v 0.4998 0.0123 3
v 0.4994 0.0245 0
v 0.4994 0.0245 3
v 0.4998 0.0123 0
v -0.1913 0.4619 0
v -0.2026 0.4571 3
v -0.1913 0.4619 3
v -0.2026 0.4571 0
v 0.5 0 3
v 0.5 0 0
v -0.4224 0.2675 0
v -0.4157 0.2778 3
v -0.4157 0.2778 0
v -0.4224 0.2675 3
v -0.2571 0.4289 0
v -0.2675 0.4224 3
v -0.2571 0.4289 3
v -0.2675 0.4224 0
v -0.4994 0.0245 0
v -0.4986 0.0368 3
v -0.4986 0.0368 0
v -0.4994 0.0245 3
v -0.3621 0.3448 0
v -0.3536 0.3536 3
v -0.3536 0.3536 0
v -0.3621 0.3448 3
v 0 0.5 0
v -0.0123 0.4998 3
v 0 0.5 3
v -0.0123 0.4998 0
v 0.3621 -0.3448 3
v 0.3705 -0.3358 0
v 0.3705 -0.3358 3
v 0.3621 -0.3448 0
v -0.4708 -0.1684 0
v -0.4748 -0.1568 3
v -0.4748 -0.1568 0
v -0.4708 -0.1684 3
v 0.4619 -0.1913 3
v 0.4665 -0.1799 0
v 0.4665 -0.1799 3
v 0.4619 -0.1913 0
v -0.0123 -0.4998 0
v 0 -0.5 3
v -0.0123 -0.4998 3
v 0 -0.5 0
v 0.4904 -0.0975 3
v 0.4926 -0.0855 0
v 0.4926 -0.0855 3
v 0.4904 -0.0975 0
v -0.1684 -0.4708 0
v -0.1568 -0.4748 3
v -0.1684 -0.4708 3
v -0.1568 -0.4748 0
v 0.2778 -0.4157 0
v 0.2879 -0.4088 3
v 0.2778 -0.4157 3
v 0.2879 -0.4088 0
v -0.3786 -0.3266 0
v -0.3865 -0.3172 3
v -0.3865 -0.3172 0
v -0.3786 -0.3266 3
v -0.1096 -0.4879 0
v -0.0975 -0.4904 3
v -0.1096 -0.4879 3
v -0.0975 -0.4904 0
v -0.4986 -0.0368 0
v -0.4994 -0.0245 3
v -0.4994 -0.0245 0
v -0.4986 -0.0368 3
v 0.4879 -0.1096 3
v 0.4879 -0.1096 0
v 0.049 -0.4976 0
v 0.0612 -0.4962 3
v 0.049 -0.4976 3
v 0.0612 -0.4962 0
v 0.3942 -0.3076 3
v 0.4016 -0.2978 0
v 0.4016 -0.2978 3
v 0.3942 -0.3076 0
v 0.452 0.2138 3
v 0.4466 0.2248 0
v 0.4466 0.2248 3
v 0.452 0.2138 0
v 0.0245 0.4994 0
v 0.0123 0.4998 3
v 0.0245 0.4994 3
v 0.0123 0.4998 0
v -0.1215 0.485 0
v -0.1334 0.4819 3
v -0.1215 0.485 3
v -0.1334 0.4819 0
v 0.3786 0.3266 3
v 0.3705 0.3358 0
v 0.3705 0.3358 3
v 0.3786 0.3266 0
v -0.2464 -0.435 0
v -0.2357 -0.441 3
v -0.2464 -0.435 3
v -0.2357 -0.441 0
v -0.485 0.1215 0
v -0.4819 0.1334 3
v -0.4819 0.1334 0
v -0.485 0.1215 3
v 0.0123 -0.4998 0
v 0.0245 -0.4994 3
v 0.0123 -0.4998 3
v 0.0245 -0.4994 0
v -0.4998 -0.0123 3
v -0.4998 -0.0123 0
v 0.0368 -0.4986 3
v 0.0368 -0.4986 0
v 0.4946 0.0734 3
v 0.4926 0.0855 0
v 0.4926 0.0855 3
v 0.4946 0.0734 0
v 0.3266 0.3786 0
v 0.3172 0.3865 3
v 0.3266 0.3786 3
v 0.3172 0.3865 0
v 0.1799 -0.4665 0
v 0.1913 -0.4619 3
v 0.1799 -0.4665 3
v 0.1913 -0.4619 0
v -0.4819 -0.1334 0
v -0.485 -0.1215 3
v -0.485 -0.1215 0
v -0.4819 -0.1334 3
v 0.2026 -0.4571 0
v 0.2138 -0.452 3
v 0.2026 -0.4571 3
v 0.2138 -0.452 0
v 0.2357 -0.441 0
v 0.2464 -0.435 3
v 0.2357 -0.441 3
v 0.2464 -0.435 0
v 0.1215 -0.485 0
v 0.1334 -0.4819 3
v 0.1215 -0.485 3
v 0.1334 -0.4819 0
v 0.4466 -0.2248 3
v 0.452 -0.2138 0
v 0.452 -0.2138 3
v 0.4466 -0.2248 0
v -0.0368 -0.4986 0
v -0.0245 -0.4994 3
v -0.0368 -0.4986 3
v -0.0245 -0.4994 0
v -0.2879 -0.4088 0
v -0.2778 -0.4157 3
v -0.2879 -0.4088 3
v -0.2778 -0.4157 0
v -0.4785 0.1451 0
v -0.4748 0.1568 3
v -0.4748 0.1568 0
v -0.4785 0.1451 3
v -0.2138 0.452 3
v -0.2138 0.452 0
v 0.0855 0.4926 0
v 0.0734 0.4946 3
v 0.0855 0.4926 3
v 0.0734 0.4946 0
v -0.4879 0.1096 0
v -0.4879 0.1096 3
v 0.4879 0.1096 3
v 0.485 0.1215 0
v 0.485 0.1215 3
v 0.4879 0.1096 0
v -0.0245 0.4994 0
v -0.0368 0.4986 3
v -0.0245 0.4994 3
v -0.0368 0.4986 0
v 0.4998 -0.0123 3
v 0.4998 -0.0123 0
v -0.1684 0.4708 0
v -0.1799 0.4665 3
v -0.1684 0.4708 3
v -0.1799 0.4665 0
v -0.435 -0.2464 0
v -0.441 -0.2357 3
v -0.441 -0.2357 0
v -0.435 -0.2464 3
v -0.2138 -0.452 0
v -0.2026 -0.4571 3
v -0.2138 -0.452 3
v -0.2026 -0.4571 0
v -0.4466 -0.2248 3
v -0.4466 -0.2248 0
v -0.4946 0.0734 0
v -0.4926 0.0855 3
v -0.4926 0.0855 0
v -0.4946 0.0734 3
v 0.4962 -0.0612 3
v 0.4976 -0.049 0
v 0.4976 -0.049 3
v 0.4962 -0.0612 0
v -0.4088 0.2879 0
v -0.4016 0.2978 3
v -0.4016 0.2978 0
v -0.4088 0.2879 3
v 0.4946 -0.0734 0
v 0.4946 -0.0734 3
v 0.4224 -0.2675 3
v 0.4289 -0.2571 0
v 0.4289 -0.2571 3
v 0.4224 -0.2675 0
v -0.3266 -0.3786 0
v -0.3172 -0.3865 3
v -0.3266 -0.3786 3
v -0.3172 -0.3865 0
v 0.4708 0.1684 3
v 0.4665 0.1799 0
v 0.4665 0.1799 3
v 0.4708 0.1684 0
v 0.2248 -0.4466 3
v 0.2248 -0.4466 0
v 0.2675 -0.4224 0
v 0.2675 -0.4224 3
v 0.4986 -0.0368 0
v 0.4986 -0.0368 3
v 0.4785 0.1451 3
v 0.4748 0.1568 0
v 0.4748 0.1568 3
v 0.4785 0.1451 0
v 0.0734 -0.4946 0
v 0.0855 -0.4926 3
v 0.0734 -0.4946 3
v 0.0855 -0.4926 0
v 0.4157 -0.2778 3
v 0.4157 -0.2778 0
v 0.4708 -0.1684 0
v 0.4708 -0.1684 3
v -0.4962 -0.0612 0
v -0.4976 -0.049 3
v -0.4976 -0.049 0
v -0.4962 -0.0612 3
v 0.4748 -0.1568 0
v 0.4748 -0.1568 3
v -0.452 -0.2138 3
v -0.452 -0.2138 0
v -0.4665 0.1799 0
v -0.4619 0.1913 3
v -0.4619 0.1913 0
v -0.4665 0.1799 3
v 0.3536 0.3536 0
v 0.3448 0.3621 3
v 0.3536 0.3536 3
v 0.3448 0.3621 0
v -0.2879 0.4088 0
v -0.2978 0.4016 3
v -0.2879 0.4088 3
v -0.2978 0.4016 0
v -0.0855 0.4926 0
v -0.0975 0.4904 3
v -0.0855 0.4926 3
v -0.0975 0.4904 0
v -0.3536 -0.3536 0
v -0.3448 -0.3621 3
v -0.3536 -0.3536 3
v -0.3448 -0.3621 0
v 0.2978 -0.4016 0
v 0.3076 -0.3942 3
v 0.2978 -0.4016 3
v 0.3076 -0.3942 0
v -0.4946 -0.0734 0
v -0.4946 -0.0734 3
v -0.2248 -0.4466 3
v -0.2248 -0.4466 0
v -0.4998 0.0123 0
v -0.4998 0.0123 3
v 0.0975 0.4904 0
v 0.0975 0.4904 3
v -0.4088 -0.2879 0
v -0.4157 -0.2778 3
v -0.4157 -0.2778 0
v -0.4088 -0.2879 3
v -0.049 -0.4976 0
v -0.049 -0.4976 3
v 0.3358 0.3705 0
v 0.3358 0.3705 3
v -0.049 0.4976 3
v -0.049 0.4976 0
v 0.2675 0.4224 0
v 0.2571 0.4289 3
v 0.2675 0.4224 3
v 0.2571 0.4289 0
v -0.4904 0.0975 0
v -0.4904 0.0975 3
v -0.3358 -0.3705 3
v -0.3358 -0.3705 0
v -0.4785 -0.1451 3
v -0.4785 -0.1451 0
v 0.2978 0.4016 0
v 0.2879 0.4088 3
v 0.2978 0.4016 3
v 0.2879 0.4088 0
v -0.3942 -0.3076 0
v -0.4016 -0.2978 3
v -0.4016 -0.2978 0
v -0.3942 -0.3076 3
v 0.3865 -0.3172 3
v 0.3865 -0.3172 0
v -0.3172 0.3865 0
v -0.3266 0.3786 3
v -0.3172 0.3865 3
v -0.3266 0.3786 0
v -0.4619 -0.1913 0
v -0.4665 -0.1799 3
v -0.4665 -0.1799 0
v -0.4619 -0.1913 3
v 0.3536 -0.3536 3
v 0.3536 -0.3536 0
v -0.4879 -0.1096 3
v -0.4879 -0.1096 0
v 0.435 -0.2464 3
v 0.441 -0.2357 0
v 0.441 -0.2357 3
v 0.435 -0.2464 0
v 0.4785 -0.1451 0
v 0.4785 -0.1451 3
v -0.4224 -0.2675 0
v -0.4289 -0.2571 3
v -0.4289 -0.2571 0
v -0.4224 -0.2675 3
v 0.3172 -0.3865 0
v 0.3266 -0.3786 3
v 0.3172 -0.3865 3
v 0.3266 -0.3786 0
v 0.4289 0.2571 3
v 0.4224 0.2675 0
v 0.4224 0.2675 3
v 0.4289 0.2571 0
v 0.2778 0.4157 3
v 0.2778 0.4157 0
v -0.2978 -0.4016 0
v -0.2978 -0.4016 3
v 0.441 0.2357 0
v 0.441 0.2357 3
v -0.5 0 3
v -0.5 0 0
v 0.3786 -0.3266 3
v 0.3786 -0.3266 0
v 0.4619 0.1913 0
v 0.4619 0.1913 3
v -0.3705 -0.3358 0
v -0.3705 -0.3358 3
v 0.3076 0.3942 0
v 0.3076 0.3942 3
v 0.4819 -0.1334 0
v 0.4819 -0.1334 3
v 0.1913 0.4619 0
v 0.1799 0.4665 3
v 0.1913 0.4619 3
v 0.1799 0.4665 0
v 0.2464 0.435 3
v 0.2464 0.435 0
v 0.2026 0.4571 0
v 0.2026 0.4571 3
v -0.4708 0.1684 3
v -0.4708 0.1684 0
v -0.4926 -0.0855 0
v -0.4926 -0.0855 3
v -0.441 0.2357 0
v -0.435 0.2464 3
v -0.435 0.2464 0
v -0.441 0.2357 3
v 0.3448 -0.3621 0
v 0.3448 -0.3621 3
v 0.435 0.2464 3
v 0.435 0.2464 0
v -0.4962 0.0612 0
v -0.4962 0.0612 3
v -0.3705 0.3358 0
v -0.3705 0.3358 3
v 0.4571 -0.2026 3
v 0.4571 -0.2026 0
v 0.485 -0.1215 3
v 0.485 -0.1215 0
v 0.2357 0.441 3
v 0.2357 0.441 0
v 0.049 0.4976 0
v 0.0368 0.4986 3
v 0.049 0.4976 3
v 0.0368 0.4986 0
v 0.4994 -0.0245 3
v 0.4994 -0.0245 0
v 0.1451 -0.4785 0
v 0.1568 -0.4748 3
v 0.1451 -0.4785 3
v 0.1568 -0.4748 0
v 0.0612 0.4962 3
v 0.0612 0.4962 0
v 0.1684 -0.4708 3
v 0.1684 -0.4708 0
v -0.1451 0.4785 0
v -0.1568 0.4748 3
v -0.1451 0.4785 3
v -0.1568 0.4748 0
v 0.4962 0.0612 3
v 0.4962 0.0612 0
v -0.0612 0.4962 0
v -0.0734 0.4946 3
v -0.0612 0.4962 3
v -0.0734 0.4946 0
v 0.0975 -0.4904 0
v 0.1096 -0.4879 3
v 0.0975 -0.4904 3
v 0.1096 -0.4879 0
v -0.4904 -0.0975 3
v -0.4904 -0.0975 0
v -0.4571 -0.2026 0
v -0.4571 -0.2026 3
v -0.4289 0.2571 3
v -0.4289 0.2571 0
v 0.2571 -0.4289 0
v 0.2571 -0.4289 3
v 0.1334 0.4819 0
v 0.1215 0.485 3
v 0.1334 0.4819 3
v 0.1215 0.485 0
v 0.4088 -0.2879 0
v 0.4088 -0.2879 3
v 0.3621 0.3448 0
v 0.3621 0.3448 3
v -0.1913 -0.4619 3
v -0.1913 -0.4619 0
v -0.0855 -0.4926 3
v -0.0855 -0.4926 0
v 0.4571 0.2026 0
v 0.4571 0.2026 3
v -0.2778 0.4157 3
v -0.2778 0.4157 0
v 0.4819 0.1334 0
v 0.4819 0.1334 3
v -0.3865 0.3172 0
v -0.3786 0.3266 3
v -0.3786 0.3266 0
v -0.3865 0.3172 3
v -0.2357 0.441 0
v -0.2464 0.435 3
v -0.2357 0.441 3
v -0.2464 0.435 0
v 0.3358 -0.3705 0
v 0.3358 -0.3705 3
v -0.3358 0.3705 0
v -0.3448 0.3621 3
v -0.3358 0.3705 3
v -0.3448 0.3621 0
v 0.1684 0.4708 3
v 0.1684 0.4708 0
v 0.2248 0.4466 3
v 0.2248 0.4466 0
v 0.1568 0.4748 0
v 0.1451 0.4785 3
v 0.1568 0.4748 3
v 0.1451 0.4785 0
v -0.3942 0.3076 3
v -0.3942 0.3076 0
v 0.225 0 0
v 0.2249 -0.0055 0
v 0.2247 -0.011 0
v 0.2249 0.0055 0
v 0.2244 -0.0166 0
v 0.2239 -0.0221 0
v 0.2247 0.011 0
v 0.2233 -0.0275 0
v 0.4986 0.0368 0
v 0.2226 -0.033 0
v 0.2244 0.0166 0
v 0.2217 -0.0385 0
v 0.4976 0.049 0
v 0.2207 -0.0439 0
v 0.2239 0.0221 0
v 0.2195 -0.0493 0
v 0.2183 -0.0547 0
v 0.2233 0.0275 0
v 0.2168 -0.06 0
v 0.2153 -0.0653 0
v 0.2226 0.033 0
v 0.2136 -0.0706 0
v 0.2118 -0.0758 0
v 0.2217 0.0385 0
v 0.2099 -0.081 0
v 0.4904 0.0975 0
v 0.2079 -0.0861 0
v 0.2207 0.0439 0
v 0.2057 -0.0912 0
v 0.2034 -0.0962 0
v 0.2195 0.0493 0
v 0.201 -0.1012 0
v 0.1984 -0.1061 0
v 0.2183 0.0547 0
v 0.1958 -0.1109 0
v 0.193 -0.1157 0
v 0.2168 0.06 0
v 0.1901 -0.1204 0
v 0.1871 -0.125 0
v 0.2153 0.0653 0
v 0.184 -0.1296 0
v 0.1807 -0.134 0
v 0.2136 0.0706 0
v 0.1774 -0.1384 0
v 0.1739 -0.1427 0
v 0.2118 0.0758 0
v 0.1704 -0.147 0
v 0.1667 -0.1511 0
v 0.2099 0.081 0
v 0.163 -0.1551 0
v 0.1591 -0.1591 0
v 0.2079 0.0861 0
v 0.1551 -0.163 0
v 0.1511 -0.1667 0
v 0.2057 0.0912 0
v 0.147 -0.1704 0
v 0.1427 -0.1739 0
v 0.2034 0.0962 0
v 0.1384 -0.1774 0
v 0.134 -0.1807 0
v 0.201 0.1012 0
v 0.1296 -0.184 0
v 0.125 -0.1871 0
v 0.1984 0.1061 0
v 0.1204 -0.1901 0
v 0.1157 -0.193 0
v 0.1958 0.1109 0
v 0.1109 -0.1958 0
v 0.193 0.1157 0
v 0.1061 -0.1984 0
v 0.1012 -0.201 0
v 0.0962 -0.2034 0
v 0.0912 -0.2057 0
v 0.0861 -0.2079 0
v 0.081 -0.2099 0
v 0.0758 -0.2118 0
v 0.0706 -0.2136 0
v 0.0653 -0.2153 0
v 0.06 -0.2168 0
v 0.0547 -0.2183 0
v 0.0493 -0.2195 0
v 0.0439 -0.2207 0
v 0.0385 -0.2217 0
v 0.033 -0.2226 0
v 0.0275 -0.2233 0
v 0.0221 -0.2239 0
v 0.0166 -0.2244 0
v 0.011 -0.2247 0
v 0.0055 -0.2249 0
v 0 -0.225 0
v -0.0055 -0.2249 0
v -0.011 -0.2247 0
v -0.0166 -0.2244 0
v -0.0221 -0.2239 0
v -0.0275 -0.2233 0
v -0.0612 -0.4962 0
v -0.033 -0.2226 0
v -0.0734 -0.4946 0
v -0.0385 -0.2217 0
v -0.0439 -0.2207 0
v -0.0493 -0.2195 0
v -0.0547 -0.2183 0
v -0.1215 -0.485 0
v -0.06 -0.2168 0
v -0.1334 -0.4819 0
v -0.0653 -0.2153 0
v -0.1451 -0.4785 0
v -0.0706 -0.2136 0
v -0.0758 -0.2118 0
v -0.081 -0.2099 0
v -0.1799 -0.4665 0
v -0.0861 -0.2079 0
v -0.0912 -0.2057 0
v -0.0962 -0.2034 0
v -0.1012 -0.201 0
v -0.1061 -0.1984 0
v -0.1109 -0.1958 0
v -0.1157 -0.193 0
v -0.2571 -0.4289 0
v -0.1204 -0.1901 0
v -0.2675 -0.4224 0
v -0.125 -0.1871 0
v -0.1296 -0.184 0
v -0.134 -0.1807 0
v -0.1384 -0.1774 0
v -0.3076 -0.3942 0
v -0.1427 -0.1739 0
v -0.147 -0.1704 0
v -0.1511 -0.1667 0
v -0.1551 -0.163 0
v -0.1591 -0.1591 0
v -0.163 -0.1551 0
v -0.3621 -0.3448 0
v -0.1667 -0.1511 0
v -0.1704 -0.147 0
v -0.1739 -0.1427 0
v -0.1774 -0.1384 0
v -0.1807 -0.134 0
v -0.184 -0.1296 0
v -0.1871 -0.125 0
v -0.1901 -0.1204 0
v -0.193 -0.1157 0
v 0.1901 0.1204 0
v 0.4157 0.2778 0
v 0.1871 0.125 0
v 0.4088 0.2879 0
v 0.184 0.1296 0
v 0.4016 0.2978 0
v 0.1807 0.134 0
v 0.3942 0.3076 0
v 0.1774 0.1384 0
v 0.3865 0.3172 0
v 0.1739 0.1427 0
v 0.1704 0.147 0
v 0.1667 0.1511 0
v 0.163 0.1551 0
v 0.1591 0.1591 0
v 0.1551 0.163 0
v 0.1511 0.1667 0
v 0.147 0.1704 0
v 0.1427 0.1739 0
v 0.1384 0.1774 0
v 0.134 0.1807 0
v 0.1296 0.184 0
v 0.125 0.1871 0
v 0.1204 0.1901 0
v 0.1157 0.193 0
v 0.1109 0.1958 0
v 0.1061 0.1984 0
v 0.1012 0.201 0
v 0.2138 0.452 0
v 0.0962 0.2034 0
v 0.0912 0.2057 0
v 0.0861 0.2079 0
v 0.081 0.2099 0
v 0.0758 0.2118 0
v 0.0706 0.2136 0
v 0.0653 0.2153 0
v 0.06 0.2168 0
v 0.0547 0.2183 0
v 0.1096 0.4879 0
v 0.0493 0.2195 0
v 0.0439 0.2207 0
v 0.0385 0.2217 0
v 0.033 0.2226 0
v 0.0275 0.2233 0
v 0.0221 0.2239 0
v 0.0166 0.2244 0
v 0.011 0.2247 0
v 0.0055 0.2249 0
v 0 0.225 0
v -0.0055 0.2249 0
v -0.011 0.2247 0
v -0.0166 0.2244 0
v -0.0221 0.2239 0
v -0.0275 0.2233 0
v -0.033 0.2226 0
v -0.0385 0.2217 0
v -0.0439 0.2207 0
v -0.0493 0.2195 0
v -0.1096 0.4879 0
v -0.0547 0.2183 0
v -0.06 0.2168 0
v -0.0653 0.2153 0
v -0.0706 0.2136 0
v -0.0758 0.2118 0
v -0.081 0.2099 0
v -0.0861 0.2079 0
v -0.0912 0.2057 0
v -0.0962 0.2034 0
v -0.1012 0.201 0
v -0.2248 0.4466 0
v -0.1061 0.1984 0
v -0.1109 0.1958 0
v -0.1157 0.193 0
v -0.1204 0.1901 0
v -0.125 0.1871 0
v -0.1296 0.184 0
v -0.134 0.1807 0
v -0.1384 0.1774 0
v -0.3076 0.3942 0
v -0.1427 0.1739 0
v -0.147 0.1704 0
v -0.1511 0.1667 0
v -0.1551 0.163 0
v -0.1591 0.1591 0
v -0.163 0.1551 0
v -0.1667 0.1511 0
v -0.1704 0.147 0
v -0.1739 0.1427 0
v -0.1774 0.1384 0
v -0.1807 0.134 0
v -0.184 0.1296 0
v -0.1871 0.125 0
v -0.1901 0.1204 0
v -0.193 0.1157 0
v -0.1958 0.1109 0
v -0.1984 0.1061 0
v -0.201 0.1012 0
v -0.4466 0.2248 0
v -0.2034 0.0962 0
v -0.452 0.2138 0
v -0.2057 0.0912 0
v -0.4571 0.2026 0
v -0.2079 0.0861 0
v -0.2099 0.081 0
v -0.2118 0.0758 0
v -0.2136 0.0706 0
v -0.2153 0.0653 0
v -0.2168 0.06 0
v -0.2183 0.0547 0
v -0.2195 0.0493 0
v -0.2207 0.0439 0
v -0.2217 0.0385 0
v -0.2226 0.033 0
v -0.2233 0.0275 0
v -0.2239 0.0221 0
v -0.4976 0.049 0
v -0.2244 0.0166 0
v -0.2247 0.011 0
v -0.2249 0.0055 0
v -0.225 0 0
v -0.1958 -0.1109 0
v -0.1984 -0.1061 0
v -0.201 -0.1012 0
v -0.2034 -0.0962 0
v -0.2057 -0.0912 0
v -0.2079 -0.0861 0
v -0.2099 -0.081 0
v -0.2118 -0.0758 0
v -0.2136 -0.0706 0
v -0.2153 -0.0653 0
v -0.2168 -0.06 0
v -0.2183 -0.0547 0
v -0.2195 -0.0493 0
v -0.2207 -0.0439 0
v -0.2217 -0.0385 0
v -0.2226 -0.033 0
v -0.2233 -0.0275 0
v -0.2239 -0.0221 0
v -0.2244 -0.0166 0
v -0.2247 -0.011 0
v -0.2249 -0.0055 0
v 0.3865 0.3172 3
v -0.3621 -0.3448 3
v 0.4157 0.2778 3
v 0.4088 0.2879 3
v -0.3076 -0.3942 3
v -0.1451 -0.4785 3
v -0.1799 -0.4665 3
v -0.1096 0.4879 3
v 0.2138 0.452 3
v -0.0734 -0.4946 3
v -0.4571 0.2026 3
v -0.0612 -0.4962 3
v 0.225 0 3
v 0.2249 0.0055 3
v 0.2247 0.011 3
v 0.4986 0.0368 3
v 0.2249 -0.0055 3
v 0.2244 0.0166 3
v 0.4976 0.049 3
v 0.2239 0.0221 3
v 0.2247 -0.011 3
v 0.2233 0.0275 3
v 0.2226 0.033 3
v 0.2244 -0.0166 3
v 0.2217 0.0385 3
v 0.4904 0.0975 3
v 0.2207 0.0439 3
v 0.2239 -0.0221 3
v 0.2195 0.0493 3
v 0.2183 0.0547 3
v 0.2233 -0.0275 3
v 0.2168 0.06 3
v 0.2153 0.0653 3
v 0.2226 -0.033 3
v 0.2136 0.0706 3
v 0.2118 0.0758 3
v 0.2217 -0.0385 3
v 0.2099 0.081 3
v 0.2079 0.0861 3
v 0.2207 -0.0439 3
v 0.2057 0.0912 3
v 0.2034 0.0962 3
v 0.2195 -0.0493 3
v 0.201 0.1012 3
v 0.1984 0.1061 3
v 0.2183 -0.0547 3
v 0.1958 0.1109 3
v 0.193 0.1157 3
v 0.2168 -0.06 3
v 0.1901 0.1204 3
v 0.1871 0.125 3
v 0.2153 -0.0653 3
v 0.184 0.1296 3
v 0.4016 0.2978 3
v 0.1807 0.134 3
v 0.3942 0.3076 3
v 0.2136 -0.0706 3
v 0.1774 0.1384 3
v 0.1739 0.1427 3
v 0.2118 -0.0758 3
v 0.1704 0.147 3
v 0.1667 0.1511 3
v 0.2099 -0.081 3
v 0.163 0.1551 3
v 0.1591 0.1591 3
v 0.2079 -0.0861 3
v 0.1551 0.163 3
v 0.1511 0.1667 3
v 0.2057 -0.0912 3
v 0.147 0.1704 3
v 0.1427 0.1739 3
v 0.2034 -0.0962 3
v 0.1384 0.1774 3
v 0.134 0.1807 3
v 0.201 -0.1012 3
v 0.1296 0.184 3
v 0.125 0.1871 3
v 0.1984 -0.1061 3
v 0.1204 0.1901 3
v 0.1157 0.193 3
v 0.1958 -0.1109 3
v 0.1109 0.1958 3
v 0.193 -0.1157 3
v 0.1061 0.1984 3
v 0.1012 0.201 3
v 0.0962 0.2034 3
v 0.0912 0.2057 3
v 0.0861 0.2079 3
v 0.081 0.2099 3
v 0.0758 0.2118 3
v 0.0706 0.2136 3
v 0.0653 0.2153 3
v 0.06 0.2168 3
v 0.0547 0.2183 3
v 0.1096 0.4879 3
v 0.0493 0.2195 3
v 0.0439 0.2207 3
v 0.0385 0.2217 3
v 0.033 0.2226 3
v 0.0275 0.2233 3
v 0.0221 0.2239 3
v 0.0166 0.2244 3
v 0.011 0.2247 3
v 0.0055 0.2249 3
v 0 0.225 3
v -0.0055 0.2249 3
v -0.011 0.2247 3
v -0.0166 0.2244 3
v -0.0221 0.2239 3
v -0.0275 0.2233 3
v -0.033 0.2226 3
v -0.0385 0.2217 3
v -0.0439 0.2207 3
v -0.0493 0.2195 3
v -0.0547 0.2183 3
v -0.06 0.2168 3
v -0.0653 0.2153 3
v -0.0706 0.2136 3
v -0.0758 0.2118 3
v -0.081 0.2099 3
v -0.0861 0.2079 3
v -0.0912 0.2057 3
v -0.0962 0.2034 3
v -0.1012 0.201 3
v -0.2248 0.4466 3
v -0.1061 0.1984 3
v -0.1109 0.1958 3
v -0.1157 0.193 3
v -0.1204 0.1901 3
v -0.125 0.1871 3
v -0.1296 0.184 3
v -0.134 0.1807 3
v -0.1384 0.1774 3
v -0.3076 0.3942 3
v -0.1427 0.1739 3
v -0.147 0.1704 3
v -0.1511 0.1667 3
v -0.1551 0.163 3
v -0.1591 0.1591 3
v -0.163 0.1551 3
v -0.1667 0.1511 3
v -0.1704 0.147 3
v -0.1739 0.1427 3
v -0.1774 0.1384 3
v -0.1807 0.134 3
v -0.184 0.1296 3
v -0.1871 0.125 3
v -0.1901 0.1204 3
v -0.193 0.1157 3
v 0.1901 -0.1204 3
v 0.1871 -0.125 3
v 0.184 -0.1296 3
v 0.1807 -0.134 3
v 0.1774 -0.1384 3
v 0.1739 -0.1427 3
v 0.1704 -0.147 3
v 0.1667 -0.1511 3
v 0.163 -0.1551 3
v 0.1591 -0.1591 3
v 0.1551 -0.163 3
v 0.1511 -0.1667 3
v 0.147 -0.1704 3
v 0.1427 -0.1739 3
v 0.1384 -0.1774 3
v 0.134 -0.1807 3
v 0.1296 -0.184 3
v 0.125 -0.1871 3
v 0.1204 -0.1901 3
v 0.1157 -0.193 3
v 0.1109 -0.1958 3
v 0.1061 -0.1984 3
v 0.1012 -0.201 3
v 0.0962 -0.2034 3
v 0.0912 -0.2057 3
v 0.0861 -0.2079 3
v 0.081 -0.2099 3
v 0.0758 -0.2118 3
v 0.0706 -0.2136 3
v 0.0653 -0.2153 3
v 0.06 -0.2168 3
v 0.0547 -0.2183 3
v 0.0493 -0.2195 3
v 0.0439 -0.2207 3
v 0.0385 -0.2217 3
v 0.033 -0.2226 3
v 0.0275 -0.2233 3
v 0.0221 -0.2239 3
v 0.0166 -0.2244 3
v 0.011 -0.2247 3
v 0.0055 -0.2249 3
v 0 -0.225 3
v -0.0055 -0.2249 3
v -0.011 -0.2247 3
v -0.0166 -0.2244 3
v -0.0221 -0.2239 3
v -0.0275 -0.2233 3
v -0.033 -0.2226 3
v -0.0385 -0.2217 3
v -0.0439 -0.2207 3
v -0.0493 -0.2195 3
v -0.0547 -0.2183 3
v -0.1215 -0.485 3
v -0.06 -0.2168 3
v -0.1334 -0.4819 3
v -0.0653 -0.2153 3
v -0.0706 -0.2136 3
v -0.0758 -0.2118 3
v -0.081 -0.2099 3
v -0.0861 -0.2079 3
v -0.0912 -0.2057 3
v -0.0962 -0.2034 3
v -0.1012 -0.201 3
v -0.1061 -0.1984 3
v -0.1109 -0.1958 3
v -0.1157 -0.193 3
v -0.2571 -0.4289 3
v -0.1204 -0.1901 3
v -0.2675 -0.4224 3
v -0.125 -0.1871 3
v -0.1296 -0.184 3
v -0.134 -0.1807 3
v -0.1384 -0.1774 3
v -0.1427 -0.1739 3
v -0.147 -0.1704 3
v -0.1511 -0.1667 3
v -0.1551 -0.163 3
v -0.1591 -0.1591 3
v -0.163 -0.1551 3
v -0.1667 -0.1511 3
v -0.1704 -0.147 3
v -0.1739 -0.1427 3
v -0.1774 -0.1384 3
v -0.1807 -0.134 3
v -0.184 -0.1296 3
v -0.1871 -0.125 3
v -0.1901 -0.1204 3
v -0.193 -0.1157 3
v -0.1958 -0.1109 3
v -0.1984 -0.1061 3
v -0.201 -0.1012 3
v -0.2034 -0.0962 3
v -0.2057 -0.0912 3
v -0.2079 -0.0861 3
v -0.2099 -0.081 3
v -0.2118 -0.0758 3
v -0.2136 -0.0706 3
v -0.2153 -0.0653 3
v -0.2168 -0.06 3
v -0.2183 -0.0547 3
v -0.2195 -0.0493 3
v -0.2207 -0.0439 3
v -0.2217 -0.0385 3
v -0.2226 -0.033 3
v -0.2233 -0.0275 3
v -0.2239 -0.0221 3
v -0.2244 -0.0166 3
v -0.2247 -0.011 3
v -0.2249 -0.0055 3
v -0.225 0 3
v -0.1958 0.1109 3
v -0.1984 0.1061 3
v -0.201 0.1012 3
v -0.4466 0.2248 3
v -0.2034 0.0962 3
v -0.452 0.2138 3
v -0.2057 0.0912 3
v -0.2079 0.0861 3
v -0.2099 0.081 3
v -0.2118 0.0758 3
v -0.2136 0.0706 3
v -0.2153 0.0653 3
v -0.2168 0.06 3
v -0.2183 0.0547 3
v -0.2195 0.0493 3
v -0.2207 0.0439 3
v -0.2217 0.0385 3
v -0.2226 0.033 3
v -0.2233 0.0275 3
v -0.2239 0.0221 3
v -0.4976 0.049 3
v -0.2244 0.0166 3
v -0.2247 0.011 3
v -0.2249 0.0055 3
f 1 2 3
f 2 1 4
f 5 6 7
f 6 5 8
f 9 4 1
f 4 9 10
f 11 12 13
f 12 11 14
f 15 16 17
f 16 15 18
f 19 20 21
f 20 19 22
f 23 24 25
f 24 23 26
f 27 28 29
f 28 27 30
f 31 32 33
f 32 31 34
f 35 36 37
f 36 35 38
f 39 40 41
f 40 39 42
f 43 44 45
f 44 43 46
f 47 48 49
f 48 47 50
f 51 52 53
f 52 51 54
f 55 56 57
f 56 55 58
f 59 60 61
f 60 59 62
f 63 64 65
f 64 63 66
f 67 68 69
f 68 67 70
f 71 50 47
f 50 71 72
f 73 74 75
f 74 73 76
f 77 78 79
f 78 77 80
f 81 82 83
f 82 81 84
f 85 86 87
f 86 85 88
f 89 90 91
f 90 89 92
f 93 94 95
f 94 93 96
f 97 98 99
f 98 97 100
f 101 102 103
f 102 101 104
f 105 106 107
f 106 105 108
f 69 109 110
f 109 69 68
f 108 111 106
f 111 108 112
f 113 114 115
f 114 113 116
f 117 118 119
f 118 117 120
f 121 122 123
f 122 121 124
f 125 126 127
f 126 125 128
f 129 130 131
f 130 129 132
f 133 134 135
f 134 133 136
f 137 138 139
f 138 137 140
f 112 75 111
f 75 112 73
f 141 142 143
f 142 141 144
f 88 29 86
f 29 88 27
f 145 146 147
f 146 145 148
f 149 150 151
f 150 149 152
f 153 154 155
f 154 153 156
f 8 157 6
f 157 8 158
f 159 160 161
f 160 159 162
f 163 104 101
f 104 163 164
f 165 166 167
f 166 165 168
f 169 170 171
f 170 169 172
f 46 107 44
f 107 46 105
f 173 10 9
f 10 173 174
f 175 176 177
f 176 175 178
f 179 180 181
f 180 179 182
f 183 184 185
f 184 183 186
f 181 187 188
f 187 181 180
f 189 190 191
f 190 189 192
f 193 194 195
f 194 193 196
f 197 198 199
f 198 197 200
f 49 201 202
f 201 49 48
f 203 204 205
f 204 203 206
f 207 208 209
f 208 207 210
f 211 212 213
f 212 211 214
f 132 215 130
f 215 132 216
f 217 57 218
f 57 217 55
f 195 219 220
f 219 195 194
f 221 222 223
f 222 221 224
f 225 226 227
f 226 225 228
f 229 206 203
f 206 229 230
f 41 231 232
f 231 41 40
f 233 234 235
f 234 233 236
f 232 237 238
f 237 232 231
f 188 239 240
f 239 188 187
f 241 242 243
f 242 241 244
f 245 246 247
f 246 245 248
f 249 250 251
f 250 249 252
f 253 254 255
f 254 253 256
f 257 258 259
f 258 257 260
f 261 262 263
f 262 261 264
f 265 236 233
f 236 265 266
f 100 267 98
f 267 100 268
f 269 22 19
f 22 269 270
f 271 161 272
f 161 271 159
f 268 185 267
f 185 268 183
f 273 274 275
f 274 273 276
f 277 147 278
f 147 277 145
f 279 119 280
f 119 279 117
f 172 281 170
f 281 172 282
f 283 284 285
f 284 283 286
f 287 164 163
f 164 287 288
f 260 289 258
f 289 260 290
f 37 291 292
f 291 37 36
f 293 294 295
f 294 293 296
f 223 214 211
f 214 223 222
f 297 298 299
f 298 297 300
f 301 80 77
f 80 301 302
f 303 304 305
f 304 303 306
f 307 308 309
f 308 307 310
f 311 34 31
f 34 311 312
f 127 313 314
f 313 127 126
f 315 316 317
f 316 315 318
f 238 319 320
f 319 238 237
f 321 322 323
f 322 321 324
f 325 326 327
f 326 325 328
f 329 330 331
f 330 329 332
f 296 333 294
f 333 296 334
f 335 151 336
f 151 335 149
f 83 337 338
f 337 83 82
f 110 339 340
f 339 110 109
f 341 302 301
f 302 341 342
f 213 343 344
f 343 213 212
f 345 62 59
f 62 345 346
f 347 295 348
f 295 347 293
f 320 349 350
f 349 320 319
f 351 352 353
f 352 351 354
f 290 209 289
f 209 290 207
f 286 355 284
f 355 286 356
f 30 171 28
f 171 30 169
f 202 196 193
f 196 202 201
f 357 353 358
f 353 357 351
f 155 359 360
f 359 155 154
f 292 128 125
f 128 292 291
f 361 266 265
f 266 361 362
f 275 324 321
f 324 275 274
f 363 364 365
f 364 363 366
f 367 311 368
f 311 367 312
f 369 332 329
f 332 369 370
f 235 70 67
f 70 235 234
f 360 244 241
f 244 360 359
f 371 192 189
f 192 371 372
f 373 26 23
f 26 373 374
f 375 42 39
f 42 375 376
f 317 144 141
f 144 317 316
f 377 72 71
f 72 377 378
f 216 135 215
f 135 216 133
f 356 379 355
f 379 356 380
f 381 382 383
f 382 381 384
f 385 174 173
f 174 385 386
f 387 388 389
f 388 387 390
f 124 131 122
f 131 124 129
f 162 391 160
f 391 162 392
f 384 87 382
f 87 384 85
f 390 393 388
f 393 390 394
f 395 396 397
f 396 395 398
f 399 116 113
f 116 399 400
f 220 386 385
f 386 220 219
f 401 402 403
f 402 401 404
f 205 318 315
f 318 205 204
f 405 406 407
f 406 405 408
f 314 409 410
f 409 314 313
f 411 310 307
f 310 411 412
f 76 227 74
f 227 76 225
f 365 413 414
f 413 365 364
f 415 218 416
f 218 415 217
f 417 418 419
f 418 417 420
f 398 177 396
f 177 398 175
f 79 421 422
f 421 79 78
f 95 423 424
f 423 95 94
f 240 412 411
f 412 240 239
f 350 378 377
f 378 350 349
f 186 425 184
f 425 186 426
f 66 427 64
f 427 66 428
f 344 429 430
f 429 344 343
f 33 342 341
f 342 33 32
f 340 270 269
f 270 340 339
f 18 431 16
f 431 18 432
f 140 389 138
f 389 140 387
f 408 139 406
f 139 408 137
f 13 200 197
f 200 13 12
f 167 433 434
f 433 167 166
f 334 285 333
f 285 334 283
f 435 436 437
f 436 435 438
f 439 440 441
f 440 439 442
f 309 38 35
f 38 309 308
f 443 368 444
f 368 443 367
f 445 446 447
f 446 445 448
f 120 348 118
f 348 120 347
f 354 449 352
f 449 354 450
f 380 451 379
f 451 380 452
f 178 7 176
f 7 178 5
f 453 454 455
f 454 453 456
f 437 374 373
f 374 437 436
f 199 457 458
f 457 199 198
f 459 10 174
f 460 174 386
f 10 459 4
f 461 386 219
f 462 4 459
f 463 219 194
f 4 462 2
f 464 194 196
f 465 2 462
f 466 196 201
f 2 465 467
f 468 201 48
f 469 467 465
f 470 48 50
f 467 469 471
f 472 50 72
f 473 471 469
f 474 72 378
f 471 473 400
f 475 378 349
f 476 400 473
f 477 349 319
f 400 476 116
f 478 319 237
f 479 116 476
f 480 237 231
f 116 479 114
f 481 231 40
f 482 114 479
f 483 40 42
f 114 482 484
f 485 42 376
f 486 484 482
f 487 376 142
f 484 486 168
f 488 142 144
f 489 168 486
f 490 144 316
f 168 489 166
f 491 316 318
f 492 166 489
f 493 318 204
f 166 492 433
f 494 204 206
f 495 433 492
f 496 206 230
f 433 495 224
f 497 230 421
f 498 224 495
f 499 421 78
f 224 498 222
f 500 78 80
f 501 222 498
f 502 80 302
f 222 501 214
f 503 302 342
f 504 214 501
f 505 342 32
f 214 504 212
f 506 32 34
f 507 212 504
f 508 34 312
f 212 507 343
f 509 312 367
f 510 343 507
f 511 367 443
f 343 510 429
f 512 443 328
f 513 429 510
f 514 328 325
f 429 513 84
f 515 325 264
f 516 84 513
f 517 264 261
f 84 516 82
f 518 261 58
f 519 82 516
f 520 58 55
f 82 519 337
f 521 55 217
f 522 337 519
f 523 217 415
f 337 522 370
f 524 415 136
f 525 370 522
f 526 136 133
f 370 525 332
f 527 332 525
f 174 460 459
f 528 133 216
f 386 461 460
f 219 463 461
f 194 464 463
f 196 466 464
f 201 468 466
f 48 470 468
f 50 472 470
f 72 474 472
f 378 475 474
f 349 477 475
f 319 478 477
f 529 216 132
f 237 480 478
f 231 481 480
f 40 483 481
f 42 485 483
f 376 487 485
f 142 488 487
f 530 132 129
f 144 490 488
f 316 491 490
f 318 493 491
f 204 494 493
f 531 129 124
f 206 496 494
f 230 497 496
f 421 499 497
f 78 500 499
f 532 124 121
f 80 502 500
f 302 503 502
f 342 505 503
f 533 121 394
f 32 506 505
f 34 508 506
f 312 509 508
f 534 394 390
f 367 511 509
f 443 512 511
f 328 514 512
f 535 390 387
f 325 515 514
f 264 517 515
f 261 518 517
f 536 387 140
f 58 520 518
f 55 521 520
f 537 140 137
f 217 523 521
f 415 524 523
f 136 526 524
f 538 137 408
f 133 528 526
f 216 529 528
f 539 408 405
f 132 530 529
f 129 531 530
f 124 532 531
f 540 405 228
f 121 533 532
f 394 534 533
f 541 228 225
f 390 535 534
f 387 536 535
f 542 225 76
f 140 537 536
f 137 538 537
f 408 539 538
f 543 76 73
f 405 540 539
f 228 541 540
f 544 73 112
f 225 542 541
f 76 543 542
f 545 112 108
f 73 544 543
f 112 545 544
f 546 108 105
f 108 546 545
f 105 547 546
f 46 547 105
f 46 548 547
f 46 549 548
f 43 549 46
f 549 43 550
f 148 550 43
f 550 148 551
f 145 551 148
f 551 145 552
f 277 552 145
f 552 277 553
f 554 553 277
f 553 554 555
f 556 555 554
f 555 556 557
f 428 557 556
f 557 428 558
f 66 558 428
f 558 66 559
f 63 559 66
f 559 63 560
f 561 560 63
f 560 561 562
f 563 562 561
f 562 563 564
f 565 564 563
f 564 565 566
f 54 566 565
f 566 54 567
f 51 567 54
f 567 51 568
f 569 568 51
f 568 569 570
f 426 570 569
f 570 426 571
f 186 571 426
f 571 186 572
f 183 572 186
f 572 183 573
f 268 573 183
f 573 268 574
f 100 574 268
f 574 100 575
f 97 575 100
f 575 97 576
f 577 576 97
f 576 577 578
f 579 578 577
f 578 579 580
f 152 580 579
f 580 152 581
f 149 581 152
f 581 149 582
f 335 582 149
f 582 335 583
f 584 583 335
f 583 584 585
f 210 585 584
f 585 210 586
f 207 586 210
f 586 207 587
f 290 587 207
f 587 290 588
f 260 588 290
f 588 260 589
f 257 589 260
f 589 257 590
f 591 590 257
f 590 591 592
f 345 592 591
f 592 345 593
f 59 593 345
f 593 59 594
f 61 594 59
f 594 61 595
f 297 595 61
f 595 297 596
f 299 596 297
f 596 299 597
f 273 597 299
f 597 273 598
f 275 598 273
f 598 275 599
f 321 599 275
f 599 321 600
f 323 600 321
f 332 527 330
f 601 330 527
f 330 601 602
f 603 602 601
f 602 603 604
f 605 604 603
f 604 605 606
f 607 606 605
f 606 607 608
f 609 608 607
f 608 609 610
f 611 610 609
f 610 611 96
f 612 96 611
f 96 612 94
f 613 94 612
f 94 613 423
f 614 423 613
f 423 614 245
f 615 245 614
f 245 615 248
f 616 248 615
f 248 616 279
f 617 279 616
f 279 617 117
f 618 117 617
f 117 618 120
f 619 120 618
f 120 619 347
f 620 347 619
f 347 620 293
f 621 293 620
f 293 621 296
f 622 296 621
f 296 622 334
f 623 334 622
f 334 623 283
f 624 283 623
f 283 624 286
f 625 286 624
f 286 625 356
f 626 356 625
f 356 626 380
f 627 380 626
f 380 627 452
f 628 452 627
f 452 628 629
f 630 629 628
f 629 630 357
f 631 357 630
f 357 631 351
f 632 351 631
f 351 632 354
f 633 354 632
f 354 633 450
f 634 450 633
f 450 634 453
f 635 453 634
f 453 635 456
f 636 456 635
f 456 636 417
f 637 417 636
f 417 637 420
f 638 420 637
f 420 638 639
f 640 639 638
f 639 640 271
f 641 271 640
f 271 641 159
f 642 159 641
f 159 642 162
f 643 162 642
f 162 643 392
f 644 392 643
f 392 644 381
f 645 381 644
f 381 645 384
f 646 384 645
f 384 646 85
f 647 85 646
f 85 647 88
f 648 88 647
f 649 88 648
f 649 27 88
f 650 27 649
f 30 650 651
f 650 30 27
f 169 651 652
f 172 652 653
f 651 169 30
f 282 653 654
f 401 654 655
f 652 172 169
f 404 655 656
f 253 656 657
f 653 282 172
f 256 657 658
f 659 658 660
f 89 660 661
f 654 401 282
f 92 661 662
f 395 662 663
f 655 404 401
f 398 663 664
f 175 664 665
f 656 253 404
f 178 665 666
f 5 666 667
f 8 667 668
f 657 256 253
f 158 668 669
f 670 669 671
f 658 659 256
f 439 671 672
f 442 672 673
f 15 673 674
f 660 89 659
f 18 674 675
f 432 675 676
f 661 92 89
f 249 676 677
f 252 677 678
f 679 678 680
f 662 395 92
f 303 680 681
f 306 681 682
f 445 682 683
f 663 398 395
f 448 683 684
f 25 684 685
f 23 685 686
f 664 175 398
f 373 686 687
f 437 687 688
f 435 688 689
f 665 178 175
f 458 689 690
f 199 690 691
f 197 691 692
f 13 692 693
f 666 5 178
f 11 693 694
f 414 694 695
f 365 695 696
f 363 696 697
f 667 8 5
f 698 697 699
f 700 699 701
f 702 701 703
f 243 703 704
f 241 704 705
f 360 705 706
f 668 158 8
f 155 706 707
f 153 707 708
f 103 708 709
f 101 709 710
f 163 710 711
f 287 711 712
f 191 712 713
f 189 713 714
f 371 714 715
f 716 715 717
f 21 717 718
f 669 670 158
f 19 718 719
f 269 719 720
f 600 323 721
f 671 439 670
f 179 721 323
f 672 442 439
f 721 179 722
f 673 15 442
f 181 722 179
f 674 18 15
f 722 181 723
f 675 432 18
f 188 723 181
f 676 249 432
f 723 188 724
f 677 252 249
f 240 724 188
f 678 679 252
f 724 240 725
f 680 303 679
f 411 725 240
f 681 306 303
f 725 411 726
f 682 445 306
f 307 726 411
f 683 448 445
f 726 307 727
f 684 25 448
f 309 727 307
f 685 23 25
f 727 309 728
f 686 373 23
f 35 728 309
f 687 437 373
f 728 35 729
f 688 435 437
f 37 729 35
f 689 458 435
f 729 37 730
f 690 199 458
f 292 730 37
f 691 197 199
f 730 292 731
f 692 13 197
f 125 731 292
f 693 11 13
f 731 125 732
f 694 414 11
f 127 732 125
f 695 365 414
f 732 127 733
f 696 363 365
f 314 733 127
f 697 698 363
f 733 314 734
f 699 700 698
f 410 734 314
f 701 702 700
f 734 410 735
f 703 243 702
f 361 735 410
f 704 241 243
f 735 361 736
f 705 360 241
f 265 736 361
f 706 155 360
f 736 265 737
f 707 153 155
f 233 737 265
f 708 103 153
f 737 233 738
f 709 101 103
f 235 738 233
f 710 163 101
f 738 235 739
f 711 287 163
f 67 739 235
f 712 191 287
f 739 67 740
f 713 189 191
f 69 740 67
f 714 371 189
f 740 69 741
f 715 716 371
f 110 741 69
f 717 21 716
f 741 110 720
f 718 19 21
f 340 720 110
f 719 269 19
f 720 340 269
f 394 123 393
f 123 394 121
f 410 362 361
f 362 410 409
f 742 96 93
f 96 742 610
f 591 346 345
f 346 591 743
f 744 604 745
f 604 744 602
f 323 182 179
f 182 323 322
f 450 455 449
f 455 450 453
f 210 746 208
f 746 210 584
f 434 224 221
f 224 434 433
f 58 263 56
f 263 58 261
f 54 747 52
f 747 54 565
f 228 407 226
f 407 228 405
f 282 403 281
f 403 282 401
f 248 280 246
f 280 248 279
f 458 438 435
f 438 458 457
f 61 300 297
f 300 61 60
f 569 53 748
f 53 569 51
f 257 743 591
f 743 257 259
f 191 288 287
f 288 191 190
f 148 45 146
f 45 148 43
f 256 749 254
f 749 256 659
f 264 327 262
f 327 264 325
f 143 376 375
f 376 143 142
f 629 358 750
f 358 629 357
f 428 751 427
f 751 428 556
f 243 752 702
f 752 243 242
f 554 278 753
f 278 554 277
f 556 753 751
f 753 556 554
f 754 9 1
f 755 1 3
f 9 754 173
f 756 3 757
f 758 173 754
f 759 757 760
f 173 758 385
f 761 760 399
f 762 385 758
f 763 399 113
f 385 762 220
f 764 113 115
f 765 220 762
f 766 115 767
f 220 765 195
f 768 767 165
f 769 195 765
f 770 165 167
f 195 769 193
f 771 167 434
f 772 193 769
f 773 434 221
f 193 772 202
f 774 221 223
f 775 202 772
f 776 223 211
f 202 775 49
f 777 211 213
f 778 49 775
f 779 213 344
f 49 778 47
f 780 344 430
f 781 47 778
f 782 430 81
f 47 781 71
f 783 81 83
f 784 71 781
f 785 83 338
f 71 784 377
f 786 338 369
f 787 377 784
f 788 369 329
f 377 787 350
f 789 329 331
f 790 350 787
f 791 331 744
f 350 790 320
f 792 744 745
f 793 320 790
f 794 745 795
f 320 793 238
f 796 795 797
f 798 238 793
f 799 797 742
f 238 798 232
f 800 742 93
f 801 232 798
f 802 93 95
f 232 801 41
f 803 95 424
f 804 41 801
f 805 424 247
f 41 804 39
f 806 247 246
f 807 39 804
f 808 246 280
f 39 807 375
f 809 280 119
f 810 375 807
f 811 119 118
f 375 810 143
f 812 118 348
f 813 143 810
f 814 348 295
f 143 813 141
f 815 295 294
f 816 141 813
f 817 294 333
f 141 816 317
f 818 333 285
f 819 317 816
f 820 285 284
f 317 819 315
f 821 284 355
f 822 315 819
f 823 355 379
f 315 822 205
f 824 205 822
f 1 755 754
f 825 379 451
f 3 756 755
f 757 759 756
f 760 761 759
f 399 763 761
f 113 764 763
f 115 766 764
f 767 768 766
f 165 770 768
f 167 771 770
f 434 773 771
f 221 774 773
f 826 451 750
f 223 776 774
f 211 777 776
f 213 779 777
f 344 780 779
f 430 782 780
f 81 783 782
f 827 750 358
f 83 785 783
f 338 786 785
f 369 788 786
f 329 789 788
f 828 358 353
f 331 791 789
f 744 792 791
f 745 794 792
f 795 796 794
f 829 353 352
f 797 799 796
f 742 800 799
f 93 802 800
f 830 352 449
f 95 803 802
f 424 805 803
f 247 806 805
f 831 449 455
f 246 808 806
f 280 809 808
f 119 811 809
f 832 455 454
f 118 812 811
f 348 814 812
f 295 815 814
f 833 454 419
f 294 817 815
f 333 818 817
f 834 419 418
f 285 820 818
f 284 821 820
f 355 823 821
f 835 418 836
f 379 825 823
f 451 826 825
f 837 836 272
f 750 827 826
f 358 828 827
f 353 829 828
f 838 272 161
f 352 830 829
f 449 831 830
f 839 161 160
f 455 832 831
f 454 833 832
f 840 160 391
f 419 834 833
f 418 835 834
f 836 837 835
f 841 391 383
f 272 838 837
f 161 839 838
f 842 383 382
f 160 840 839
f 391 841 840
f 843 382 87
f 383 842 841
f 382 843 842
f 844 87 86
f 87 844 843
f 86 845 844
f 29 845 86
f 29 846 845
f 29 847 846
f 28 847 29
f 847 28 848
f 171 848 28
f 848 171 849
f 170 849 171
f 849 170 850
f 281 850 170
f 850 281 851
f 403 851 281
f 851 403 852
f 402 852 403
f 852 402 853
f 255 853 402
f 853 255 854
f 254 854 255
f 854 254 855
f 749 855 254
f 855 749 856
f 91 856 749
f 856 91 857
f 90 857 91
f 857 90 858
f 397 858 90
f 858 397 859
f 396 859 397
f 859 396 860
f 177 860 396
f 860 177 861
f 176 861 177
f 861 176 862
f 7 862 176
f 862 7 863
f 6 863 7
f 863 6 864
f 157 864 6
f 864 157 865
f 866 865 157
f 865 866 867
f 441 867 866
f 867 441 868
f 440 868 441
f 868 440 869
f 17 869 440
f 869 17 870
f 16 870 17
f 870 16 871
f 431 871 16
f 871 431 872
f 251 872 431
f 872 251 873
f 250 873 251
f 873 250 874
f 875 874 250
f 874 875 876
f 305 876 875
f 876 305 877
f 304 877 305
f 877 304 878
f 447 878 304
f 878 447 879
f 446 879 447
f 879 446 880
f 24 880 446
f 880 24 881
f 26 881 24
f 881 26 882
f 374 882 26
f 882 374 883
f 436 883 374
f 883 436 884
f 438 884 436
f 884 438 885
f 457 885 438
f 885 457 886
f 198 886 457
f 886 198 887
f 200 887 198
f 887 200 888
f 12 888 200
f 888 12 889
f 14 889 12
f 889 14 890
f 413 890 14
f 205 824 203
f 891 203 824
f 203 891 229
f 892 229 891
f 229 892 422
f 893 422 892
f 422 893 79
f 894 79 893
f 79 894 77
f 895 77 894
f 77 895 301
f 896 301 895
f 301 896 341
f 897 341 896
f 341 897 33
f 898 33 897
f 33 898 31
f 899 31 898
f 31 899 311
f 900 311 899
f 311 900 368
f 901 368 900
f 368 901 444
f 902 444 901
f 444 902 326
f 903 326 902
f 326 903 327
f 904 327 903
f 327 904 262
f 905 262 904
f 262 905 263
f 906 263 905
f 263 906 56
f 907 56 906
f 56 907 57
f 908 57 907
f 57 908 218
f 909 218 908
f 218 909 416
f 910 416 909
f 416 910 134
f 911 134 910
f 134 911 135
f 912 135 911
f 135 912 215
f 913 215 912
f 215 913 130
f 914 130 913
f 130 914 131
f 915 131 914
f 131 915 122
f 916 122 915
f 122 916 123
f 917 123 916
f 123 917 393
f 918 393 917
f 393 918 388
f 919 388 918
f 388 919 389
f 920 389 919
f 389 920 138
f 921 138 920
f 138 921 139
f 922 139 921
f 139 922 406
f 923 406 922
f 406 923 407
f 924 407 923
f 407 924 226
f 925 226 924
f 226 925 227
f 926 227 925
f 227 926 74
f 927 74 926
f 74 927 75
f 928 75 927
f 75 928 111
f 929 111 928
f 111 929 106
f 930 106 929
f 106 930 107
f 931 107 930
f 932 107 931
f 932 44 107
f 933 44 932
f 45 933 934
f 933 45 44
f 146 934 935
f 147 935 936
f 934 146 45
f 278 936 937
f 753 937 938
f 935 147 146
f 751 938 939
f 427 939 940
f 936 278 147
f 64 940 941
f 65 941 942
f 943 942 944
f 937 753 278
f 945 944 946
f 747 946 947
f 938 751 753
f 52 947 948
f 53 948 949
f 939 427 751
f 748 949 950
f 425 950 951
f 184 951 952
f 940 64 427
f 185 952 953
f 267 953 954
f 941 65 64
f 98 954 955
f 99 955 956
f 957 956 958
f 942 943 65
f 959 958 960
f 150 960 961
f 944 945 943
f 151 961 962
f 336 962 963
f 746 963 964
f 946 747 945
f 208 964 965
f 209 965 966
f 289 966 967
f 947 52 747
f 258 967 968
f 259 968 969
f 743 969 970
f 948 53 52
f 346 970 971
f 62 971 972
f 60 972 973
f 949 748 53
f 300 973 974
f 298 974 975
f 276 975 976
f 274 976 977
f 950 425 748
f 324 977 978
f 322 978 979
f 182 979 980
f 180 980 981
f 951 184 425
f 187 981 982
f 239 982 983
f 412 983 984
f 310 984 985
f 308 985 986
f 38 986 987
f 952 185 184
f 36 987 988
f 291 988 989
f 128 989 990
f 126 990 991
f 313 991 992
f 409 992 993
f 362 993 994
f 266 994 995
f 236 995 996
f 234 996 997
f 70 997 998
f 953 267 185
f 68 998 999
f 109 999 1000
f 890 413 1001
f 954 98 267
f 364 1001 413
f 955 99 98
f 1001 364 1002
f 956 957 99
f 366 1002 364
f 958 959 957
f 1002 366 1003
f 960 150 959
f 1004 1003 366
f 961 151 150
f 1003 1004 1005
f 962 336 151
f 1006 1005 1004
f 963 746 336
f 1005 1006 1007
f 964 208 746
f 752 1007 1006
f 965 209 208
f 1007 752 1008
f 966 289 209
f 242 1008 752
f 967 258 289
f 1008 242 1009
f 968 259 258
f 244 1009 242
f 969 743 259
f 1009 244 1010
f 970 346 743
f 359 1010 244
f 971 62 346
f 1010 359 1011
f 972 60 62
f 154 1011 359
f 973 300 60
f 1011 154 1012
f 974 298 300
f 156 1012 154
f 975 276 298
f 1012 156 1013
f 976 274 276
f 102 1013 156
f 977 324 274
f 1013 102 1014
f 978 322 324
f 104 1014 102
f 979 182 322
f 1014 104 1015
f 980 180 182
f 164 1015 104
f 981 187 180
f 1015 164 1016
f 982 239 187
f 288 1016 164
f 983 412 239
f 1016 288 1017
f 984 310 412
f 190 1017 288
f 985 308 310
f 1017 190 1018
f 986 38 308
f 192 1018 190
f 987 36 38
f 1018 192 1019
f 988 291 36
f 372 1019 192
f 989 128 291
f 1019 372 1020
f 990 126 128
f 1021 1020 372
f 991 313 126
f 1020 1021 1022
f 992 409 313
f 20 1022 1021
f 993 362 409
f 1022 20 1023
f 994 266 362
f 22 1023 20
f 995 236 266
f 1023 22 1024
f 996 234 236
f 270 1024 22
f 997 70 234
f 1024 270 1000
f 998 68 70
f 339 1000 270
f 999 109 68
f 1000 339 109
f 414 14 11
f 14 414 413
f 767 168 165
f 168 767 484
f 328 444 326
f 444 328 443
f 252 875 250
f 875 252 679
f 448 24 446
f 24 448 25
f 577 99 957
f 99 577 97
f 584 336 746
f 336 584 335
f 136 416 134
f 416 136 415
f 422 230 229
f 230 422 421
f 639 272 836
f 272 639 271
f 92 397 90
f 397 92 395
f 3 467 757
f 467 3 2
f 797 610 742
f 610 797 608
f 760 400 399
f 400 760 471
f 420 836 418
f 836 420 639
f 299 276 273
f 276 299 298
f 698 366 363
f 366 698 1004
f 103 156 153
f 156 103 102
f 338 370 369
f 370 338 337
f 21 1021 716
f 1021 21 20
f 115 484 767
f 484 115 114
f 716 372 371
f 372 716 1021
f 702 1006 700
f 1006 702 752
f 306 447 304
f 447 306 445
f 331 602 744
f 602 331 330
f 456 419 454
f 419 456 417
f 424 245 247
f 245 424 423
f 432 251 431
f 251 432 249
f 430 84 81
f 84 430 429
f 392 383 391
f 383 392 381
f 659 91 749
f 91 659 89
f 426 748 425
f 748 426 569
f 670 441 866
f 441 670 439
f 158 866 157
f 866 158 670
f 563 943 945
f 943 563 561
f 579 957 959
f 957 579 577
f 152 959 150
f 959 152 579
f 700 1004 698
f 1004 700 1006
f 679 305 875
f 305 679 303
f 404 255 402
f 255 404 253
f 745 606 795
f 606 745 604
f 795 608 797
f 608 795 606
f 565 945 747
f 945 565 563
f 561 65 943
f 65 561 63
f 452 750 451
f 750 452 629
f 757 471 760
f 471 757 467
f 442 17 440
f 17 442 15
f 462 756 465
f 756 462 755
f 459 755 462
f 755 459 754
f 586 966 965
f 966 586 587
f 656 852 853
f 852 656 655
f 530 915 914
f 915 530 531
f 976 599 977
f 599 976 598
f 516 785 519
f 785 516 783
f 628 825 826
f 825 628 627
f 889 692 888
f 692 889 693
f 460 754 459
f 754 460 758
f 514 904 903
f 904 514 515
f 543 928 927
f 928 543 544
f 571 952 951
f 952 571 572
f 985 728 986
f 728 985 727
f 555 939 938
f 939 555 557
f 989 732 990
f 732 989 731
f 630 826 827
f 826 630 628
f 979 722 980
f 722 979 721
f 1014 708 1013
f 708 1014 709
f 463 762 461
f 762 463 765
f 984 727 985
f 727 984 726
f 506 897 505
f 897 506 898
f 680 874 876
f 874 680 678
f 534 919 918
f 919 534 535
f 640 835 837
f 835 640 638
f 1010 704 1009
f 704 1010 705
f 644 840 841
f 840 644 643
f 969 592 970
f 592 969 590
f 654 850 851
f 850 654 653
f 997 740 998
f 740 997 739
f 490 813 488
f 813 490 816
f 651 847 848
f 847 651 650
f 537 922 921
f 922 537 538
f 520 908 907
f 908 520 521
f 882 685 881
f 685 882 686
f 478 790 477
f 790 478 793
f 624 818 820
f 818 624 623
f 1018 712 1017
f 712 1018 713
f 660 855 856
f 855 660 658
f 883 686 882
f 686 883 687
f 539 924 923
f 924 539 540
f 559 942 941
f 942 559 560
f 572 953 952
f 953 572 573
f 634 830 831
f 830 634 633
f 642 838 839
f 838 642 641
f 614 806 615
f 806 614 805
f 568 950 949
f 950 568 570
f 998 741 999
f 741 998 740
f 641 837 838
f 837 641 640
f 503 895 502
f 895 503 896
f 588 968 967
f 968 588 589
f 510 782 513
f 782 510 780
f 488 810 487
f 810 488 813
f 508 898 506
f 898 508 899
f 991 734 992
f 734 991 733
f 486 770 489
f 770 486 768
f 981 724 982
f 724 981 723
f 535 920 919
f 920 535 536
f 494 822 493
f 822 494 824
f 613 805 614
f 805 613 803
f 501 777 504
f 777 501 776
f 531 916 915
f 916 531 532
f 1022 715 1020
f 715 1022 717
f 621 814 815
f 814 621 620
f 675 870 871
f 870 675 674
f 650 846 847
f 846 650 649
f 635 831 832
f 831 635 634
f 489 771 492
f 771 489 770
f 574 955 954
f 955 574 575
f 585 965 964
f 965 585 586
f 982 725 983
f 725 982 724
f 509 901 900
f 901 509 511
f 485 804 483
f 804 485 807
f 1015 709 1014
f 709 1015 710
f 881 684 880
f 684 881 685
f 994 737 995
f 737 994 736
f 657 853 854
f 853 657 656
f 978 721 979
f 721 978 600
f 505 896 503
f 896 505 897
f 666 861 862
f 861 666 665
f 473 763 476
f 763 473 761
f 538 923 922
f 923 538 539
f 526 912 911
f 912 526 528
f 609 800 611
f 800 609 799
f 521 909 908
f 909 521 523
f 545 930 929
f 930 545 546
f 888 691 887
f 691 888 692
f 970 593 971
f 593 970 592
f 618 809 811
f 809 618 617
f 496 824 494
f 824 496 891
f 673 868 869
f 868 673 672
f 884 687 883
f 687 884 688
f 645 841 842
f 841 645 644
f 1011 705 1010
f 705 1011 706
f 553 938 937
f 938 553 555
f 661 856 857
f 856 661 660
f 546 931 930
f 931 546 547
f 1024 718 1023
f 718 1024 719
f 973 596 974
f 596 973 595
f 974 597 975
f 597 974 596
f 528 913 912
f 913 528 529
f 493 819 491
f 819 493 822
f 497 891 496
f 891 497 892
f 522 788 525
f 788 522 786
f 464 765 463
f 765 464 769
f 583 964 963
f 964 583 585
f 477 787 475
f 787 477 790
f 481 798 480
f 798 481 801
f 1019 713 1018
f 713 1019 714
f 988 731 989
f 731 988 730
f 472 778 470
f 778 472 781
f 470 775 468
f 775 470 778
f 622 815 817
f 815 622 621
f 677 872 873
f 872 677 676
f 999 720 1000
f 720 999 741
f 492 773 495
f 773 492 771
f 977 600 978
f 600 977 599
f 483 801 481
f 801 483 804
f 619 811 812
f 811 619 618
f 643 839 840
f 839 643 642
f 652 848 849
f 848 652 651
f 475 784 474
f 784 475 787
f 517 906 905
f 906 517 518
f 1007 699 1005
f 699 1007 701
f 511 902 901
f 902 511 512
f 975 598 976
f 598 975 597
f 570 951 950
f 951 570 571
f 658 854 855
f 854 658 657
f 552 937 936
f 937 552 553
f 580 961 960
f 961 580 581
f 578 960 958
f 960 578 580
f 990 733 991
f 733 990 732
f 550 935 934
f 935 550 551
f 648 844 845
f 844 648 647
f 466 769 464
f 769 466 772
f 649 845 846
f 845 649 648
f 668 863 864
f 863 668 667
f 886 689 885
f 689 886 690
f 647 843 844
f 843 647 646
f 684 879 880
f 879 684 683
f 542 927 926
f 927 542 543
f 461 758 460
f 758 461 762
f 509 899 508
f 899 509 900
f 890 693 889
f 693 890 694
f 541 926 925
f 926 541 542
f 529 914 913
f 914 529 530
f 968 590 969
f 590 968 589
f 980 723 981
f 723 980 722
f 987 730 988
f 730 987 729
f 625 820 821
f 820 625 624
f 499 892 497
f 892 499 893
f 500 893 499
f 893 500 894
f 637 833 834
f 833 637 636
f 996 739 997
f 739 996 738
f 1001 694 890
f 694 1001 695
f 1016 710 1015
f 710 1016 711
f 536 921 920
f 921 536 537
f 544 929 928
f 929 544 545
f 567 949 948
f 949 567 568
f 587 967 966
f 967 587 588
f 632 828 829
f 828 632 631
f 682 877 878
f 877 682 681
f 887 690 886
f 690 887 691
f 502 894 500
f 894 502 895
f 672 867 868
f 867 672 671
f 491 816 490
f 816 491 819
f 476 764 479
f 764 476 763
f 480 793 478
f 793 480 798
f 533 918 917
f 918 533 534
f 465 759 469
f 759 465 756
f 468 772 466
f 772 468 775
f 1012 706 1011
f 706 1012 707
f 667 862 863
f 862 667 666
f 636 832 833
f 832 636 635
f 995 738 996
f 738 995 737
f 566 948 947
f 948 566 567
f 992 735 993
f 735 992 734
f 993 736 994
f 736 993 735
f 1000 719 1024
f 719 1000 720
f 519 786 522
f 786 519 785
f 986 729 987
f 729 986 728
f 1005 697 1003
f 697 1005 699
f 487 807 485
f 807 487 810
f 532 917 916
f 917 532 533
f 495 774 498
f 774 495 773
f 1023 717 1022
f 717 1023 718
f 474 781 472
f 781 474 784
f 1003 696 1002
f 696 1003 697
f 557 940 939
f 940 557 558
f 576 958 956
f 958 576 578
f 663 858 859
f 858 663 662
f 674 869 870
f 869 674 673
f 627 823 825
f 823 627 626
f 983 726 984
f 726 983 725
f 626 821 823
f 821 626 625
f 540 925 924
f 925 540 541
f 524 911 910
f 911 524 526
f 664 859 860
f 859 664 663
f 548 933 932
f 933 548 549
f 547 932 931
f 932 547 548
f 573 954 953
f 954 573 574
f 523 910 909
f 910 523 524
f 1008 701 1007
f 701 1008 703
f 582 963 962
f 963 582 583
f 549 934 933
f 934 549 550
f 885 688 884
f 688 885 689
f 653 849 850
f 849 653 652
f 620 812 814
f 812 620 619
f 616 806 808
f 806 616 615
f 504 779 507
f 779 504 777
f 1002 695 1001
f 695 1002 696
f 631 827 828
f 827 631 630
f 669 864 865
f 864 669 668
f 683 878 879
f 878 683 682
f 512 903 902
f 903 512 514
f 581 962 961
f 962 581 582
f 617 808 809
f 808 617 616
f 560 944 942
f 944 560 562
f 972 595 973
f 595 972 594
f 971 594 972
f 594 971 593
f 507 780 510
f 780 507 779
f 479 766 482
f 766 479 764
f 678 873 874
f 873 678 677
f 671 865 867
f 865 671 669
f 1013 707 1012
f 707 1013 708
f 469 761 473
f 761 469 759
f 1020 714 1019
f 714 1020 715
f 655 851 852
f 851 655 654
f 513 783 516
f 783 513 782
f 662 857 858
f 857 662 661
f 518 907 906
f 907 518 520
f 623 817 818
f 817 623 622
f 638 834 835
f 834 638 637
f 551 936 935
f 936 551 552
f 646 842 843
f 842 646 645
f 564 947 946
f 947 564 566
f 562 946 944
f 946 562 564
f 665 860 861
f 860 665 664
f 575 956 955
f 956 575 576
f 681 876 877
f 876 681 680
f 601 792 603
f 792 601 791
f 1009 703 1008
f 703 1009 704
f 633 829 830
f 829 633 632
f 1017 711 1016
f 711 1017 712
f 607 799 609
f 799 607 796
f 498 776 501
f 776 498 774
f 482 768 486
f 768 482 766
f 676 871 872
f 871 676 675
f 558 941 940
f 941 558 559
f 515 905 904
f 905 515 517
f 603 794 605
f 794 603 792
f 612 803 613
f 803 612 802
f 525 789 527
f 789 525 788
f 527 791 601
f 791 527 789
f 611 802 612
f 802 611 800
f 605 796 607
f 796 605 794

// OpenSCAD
// Tube (Thick) for Stacks of Shapes
// by Slashee the Cow
$fn = 256;

color("GreenYellow")
difference(){
    linear_extrude(3)
        circle(d=1);
    linear_extrude(4)
        circle(d=0.45);
}
